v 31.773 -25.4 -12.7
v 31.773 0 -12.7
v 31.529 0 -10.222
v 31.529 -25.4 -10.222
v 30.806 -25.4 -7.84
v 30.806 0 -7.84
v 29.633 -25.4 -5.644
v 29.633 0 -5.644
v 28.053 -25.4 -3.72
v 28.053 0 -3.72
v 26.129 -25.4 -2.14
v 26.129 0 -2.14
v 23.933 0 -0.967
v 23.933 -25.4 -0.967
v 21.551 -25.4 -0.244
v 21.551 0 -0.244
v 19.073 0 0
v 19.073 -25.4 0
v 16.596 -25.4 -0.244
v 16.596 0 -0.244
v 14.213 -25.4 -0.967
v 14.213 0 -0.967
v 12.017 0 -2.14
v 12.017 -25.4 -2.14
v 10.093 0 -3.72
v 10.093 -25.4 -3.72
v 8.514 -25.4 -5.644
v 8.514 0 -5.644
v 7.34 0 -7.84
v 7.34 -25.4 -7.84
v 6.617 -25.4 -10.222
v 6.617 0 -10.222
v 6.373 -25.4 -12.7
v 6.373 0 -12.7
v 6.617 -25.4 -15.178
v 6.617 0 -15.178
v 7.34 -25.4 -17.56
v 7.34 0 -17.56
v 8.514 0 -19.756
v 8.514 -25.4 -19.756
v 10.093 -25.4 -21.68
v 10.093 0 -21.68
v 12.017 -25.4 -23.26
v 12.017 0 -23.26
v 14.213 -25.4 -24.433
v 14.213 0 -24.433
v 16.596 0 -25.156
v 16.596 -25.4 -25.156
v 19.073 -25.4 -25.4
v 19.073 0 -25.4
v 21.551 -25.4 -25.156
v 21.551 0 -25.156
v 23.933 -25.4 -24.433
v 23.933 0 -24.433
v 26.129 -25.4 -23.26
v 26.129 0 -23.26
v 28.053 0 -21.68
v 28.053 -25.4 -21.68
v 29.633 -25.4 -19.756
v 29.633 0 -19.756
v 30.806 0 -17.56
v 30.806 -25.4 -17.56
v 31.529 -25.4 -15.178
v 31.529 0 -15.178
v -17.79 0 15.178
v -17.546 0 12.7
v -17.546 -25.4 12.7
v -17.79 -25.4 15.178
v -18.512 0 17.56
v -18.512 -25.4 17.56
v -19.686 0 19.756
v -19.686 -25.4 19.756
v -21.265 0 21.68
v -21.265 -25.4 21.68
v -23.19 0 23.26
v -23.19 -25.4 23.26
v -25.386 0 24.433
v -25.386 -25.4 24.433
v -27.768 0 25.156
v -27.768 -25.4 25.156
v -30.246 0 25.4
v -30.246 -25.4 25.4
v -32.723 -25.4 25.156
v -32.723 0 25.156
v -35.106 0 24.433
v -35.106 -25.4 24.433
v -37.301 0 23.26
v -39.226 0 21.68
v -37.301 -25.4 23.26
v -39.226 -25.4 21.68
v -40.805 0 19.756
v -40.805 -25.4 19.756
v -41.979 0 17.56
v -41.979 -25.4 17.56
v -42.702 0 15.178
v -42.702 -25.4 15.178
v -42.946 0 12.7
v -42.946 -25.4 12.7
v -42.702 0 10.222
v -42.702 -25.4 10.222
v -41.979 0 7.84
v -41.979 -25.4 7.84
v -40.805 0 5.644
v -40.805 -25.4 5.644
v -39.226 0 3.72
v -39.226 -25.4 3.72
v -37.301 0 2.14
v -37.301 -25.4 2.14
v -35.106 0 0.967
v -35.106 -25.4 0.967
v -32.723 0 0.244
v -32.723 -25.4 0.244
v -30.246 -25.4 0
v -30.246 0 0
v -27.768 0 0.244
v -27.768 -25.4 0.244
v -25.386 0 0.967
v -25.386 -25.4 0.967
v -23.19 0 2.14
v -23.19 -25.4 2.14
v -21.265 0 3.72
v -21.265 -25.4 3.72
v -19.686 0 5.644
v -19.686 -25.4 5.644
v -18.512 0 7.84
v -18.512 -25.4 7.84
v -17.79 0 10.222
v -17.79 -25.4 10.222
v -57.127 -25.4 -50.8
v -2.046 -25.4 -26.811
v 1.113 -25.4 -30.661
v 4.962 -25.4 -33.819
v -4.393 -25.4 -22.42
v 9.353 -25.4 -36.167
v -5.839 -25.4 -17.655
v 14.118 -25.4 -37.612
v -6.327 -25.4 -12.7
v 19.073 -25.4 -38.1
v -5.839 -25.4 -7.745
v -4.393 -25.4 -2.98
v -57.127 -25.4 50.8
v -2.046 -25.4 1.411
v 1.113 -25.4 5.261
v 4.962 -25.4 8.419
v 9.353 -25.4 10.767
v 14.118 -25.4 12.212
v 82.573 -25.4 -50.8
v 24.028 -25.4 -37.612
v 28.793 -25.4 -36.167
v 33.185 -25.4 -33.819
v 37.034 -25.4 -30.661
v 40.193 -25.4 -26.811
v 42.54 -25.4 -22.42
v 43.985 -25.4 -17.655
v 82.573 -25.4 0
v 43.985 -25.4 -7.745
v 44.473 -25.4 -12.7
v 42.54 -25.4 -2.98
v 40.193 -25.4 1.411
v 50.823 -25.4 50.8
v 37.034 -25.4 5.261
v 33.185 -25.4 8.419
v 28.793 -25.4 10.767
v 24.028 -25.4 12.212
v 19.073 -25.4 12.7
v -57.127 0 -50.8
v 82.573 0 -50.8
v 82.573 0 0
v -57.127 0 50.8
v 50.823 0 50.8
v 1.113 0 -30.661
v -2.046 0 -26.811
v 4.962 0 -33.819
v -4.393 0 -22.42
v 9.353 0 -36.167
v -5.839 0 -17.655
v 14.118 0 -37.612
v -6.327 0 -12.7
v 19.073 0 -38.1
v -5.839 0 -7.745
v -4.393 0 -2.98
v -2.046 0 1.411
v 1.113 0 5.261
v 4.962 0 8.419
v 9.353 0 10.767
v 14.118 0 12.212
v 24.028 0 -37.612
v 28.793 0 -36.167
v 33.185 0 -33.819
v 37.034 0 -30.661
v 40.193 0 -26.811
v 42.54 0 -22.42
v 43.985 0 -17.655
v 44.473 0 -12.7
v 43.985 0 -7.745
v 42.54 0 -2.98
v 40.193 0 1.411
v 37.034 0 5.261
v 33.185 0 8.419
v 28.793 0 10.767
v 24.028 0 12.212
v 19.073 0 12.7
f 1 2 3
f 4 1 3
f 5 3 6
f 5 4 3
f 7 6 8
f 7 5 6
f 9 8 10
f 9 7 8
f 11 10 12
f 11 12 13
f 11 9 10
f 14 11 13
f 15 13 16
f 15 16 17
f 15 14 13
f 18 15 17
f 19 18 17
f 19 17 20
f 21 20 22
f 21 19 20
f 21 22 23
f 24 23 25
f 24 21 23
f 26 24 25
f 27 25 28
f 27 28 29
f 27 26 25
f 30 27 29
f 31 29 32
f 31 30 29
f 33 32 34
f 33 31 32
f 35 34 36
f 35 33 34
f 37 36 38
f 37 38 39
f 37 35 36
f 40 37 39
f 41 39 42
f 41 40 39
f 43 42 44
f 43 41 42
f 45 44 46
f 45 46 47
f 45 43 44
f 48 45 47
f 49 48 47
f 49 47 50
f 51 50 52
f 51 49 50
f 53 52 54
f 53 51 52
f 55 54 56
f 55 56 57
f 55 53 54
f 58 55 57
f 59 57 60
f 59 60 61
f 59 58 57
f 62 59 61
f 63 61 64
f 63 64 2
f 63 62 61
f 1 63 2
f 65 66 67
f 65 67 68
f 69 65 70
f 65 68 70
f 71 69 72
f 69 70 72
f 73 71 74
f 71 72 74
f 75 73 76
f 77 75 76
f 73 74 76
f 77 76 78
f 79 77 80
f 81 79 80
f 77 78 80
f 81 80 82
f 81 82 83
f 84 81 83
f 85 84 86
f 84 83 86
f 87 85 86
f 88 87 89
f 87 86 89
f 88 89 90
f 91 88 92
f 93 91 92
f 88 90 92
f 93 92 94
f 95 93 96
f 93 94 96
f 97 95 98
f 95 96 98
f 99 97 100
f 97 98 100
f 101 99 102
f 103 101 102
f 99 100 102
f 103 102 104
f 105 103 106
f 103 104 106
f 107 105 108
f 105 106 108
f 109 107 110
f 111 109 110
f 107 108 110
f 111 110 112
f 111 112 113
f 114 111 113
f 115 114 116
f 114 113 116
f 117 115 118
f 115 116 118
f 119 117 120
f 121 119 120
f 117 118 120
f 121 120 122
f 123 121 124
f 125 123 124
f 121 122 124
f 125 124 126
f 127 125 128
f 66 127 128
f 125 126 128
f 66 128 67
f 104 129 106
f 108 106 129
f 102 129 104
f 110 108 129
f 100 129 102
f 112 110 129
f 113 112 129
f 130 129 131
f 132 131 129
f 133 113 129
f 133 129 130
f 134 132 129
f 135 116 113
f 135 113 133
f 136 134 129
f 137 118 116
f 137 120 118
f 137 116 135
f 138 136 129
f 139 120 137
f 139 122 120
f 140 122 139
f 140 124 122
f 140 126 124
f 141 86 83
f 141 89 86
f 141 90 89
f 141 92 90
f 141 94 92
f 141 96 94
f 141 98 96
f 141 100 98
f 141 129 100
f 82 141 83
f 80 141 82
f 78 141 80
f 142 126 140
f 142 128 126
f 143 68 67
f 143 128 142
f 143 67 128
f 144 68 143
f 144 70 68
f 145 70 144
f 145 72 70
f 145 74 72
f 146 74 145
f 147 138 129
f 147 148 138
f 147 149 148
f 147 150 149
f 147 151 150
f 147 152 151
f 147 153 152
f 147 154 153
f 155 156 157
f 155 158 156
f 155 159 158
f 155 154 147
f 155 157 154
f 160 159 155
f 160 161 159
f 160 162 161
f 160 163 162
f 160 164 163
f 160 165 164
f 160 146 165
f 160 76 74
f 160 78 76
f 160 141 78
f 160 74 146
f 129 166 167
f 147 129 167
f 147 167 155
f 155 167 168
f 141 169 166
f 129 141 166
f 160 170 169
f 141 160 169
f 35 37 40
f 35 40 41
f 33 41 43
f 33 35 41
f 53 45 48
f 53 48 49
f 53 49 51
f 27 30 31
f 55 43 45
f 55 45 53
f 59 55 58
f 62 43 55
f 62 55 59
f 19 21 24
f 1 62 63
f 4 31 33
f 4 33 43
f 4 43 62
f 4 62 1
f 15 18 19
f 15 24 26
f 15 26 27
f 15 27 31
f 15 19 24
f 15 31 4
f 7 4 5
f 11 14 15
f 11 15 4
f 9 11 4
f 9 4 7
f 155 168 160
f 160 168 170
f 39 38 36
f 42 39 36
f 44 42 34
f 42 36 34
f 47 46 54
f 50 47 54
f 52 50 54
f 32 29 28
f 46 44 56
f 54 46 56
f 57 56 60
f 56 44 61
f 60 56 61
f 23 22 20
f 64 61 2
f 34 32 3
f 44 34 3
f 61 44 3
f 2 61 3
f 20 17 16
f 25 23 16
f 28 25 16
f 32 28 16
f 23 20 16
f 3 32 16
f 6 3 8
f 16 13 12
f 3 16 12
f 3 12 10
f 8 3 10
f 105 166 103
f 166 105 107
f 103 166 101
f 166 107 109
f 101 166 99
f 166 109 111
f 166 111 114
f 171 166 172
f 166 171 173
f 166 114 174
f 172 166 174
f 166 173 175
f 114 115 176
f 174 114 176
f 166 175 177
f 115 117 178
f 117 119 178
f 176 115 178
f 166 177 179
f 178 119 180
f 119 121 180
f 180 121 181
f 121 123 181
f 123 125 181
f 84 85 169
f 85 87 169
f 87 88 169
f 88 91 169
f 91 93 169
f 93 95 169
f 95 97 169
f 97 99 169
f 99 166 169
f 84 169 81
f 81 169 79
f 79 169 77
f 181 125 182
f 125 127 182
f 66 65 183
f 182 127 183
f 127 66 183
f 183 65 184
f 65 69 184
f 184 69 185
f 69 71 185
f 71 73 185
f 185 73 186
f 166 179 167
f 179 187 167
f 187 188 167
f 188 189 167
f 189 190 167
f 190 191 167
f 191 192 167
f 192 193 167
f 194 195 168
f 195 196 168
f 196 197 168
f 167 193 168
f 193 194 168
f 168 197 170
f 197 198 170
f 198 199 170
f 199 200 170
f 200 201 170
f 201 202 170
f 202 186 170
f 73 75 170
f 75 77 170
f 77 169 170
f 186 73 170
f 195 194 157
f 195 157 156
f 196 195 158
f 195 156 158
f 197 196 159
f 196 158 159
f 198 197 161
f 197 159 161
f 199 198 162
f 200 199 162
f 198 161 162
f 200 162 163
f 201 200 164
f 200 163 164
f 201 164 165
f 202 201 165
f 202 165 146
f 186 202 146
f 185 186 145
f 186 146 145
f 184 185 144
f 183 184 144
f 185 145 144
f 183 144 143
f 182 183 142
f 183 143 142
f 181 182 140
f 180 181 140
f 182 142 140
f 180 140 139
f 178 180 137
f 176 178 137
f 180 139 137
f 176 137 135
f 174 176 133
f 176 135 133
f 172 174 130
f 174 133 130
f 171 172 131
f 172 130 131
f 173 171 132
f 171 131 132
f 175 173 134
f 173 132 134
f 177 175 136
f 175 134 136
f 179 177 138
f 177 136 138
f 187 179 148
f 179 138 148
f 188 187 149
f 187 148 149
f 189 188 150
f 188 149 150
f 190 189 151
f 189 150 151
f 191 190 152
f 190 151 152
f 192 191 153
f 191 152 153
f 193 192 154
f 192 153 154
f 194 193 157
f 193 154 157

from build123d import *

# Parameters (mm, degrees)
F1_DEPTH = 25.4
F2_R     = 12.7
F2_R_2   = 25.4
F3_DEPTH = 25.4


with BuildPart() as f1:
    # F0 (on Front) → F1 (new body)
    with BuildSketch(Plane.XZ):
        Polygon((50.823184, 50.8), (-57.126816, 50.8), (-57.126816, -50.8), (82.573184, -50.8), (82.573184, 0), align=None)
    extrude(amount=F1_DEPTH)

    # F2 (on face) → F3 (cut)
    with BuildSketch(Plane.XZ.offset(25.4)):
        with Locations((-30.24558, 12.7)):
            Circle(F2_R)
        with Locations((19.073184, -12.7)):
            Circle(F2_R_2)
        with Locations((19.073184, -12.7)):
            Circle(F2_R, mode=Mode.SUBTRACT)
    extrude(amount=-F3_DEPTH, mode=Mode.SUBTRACT)


solid = f1.part
